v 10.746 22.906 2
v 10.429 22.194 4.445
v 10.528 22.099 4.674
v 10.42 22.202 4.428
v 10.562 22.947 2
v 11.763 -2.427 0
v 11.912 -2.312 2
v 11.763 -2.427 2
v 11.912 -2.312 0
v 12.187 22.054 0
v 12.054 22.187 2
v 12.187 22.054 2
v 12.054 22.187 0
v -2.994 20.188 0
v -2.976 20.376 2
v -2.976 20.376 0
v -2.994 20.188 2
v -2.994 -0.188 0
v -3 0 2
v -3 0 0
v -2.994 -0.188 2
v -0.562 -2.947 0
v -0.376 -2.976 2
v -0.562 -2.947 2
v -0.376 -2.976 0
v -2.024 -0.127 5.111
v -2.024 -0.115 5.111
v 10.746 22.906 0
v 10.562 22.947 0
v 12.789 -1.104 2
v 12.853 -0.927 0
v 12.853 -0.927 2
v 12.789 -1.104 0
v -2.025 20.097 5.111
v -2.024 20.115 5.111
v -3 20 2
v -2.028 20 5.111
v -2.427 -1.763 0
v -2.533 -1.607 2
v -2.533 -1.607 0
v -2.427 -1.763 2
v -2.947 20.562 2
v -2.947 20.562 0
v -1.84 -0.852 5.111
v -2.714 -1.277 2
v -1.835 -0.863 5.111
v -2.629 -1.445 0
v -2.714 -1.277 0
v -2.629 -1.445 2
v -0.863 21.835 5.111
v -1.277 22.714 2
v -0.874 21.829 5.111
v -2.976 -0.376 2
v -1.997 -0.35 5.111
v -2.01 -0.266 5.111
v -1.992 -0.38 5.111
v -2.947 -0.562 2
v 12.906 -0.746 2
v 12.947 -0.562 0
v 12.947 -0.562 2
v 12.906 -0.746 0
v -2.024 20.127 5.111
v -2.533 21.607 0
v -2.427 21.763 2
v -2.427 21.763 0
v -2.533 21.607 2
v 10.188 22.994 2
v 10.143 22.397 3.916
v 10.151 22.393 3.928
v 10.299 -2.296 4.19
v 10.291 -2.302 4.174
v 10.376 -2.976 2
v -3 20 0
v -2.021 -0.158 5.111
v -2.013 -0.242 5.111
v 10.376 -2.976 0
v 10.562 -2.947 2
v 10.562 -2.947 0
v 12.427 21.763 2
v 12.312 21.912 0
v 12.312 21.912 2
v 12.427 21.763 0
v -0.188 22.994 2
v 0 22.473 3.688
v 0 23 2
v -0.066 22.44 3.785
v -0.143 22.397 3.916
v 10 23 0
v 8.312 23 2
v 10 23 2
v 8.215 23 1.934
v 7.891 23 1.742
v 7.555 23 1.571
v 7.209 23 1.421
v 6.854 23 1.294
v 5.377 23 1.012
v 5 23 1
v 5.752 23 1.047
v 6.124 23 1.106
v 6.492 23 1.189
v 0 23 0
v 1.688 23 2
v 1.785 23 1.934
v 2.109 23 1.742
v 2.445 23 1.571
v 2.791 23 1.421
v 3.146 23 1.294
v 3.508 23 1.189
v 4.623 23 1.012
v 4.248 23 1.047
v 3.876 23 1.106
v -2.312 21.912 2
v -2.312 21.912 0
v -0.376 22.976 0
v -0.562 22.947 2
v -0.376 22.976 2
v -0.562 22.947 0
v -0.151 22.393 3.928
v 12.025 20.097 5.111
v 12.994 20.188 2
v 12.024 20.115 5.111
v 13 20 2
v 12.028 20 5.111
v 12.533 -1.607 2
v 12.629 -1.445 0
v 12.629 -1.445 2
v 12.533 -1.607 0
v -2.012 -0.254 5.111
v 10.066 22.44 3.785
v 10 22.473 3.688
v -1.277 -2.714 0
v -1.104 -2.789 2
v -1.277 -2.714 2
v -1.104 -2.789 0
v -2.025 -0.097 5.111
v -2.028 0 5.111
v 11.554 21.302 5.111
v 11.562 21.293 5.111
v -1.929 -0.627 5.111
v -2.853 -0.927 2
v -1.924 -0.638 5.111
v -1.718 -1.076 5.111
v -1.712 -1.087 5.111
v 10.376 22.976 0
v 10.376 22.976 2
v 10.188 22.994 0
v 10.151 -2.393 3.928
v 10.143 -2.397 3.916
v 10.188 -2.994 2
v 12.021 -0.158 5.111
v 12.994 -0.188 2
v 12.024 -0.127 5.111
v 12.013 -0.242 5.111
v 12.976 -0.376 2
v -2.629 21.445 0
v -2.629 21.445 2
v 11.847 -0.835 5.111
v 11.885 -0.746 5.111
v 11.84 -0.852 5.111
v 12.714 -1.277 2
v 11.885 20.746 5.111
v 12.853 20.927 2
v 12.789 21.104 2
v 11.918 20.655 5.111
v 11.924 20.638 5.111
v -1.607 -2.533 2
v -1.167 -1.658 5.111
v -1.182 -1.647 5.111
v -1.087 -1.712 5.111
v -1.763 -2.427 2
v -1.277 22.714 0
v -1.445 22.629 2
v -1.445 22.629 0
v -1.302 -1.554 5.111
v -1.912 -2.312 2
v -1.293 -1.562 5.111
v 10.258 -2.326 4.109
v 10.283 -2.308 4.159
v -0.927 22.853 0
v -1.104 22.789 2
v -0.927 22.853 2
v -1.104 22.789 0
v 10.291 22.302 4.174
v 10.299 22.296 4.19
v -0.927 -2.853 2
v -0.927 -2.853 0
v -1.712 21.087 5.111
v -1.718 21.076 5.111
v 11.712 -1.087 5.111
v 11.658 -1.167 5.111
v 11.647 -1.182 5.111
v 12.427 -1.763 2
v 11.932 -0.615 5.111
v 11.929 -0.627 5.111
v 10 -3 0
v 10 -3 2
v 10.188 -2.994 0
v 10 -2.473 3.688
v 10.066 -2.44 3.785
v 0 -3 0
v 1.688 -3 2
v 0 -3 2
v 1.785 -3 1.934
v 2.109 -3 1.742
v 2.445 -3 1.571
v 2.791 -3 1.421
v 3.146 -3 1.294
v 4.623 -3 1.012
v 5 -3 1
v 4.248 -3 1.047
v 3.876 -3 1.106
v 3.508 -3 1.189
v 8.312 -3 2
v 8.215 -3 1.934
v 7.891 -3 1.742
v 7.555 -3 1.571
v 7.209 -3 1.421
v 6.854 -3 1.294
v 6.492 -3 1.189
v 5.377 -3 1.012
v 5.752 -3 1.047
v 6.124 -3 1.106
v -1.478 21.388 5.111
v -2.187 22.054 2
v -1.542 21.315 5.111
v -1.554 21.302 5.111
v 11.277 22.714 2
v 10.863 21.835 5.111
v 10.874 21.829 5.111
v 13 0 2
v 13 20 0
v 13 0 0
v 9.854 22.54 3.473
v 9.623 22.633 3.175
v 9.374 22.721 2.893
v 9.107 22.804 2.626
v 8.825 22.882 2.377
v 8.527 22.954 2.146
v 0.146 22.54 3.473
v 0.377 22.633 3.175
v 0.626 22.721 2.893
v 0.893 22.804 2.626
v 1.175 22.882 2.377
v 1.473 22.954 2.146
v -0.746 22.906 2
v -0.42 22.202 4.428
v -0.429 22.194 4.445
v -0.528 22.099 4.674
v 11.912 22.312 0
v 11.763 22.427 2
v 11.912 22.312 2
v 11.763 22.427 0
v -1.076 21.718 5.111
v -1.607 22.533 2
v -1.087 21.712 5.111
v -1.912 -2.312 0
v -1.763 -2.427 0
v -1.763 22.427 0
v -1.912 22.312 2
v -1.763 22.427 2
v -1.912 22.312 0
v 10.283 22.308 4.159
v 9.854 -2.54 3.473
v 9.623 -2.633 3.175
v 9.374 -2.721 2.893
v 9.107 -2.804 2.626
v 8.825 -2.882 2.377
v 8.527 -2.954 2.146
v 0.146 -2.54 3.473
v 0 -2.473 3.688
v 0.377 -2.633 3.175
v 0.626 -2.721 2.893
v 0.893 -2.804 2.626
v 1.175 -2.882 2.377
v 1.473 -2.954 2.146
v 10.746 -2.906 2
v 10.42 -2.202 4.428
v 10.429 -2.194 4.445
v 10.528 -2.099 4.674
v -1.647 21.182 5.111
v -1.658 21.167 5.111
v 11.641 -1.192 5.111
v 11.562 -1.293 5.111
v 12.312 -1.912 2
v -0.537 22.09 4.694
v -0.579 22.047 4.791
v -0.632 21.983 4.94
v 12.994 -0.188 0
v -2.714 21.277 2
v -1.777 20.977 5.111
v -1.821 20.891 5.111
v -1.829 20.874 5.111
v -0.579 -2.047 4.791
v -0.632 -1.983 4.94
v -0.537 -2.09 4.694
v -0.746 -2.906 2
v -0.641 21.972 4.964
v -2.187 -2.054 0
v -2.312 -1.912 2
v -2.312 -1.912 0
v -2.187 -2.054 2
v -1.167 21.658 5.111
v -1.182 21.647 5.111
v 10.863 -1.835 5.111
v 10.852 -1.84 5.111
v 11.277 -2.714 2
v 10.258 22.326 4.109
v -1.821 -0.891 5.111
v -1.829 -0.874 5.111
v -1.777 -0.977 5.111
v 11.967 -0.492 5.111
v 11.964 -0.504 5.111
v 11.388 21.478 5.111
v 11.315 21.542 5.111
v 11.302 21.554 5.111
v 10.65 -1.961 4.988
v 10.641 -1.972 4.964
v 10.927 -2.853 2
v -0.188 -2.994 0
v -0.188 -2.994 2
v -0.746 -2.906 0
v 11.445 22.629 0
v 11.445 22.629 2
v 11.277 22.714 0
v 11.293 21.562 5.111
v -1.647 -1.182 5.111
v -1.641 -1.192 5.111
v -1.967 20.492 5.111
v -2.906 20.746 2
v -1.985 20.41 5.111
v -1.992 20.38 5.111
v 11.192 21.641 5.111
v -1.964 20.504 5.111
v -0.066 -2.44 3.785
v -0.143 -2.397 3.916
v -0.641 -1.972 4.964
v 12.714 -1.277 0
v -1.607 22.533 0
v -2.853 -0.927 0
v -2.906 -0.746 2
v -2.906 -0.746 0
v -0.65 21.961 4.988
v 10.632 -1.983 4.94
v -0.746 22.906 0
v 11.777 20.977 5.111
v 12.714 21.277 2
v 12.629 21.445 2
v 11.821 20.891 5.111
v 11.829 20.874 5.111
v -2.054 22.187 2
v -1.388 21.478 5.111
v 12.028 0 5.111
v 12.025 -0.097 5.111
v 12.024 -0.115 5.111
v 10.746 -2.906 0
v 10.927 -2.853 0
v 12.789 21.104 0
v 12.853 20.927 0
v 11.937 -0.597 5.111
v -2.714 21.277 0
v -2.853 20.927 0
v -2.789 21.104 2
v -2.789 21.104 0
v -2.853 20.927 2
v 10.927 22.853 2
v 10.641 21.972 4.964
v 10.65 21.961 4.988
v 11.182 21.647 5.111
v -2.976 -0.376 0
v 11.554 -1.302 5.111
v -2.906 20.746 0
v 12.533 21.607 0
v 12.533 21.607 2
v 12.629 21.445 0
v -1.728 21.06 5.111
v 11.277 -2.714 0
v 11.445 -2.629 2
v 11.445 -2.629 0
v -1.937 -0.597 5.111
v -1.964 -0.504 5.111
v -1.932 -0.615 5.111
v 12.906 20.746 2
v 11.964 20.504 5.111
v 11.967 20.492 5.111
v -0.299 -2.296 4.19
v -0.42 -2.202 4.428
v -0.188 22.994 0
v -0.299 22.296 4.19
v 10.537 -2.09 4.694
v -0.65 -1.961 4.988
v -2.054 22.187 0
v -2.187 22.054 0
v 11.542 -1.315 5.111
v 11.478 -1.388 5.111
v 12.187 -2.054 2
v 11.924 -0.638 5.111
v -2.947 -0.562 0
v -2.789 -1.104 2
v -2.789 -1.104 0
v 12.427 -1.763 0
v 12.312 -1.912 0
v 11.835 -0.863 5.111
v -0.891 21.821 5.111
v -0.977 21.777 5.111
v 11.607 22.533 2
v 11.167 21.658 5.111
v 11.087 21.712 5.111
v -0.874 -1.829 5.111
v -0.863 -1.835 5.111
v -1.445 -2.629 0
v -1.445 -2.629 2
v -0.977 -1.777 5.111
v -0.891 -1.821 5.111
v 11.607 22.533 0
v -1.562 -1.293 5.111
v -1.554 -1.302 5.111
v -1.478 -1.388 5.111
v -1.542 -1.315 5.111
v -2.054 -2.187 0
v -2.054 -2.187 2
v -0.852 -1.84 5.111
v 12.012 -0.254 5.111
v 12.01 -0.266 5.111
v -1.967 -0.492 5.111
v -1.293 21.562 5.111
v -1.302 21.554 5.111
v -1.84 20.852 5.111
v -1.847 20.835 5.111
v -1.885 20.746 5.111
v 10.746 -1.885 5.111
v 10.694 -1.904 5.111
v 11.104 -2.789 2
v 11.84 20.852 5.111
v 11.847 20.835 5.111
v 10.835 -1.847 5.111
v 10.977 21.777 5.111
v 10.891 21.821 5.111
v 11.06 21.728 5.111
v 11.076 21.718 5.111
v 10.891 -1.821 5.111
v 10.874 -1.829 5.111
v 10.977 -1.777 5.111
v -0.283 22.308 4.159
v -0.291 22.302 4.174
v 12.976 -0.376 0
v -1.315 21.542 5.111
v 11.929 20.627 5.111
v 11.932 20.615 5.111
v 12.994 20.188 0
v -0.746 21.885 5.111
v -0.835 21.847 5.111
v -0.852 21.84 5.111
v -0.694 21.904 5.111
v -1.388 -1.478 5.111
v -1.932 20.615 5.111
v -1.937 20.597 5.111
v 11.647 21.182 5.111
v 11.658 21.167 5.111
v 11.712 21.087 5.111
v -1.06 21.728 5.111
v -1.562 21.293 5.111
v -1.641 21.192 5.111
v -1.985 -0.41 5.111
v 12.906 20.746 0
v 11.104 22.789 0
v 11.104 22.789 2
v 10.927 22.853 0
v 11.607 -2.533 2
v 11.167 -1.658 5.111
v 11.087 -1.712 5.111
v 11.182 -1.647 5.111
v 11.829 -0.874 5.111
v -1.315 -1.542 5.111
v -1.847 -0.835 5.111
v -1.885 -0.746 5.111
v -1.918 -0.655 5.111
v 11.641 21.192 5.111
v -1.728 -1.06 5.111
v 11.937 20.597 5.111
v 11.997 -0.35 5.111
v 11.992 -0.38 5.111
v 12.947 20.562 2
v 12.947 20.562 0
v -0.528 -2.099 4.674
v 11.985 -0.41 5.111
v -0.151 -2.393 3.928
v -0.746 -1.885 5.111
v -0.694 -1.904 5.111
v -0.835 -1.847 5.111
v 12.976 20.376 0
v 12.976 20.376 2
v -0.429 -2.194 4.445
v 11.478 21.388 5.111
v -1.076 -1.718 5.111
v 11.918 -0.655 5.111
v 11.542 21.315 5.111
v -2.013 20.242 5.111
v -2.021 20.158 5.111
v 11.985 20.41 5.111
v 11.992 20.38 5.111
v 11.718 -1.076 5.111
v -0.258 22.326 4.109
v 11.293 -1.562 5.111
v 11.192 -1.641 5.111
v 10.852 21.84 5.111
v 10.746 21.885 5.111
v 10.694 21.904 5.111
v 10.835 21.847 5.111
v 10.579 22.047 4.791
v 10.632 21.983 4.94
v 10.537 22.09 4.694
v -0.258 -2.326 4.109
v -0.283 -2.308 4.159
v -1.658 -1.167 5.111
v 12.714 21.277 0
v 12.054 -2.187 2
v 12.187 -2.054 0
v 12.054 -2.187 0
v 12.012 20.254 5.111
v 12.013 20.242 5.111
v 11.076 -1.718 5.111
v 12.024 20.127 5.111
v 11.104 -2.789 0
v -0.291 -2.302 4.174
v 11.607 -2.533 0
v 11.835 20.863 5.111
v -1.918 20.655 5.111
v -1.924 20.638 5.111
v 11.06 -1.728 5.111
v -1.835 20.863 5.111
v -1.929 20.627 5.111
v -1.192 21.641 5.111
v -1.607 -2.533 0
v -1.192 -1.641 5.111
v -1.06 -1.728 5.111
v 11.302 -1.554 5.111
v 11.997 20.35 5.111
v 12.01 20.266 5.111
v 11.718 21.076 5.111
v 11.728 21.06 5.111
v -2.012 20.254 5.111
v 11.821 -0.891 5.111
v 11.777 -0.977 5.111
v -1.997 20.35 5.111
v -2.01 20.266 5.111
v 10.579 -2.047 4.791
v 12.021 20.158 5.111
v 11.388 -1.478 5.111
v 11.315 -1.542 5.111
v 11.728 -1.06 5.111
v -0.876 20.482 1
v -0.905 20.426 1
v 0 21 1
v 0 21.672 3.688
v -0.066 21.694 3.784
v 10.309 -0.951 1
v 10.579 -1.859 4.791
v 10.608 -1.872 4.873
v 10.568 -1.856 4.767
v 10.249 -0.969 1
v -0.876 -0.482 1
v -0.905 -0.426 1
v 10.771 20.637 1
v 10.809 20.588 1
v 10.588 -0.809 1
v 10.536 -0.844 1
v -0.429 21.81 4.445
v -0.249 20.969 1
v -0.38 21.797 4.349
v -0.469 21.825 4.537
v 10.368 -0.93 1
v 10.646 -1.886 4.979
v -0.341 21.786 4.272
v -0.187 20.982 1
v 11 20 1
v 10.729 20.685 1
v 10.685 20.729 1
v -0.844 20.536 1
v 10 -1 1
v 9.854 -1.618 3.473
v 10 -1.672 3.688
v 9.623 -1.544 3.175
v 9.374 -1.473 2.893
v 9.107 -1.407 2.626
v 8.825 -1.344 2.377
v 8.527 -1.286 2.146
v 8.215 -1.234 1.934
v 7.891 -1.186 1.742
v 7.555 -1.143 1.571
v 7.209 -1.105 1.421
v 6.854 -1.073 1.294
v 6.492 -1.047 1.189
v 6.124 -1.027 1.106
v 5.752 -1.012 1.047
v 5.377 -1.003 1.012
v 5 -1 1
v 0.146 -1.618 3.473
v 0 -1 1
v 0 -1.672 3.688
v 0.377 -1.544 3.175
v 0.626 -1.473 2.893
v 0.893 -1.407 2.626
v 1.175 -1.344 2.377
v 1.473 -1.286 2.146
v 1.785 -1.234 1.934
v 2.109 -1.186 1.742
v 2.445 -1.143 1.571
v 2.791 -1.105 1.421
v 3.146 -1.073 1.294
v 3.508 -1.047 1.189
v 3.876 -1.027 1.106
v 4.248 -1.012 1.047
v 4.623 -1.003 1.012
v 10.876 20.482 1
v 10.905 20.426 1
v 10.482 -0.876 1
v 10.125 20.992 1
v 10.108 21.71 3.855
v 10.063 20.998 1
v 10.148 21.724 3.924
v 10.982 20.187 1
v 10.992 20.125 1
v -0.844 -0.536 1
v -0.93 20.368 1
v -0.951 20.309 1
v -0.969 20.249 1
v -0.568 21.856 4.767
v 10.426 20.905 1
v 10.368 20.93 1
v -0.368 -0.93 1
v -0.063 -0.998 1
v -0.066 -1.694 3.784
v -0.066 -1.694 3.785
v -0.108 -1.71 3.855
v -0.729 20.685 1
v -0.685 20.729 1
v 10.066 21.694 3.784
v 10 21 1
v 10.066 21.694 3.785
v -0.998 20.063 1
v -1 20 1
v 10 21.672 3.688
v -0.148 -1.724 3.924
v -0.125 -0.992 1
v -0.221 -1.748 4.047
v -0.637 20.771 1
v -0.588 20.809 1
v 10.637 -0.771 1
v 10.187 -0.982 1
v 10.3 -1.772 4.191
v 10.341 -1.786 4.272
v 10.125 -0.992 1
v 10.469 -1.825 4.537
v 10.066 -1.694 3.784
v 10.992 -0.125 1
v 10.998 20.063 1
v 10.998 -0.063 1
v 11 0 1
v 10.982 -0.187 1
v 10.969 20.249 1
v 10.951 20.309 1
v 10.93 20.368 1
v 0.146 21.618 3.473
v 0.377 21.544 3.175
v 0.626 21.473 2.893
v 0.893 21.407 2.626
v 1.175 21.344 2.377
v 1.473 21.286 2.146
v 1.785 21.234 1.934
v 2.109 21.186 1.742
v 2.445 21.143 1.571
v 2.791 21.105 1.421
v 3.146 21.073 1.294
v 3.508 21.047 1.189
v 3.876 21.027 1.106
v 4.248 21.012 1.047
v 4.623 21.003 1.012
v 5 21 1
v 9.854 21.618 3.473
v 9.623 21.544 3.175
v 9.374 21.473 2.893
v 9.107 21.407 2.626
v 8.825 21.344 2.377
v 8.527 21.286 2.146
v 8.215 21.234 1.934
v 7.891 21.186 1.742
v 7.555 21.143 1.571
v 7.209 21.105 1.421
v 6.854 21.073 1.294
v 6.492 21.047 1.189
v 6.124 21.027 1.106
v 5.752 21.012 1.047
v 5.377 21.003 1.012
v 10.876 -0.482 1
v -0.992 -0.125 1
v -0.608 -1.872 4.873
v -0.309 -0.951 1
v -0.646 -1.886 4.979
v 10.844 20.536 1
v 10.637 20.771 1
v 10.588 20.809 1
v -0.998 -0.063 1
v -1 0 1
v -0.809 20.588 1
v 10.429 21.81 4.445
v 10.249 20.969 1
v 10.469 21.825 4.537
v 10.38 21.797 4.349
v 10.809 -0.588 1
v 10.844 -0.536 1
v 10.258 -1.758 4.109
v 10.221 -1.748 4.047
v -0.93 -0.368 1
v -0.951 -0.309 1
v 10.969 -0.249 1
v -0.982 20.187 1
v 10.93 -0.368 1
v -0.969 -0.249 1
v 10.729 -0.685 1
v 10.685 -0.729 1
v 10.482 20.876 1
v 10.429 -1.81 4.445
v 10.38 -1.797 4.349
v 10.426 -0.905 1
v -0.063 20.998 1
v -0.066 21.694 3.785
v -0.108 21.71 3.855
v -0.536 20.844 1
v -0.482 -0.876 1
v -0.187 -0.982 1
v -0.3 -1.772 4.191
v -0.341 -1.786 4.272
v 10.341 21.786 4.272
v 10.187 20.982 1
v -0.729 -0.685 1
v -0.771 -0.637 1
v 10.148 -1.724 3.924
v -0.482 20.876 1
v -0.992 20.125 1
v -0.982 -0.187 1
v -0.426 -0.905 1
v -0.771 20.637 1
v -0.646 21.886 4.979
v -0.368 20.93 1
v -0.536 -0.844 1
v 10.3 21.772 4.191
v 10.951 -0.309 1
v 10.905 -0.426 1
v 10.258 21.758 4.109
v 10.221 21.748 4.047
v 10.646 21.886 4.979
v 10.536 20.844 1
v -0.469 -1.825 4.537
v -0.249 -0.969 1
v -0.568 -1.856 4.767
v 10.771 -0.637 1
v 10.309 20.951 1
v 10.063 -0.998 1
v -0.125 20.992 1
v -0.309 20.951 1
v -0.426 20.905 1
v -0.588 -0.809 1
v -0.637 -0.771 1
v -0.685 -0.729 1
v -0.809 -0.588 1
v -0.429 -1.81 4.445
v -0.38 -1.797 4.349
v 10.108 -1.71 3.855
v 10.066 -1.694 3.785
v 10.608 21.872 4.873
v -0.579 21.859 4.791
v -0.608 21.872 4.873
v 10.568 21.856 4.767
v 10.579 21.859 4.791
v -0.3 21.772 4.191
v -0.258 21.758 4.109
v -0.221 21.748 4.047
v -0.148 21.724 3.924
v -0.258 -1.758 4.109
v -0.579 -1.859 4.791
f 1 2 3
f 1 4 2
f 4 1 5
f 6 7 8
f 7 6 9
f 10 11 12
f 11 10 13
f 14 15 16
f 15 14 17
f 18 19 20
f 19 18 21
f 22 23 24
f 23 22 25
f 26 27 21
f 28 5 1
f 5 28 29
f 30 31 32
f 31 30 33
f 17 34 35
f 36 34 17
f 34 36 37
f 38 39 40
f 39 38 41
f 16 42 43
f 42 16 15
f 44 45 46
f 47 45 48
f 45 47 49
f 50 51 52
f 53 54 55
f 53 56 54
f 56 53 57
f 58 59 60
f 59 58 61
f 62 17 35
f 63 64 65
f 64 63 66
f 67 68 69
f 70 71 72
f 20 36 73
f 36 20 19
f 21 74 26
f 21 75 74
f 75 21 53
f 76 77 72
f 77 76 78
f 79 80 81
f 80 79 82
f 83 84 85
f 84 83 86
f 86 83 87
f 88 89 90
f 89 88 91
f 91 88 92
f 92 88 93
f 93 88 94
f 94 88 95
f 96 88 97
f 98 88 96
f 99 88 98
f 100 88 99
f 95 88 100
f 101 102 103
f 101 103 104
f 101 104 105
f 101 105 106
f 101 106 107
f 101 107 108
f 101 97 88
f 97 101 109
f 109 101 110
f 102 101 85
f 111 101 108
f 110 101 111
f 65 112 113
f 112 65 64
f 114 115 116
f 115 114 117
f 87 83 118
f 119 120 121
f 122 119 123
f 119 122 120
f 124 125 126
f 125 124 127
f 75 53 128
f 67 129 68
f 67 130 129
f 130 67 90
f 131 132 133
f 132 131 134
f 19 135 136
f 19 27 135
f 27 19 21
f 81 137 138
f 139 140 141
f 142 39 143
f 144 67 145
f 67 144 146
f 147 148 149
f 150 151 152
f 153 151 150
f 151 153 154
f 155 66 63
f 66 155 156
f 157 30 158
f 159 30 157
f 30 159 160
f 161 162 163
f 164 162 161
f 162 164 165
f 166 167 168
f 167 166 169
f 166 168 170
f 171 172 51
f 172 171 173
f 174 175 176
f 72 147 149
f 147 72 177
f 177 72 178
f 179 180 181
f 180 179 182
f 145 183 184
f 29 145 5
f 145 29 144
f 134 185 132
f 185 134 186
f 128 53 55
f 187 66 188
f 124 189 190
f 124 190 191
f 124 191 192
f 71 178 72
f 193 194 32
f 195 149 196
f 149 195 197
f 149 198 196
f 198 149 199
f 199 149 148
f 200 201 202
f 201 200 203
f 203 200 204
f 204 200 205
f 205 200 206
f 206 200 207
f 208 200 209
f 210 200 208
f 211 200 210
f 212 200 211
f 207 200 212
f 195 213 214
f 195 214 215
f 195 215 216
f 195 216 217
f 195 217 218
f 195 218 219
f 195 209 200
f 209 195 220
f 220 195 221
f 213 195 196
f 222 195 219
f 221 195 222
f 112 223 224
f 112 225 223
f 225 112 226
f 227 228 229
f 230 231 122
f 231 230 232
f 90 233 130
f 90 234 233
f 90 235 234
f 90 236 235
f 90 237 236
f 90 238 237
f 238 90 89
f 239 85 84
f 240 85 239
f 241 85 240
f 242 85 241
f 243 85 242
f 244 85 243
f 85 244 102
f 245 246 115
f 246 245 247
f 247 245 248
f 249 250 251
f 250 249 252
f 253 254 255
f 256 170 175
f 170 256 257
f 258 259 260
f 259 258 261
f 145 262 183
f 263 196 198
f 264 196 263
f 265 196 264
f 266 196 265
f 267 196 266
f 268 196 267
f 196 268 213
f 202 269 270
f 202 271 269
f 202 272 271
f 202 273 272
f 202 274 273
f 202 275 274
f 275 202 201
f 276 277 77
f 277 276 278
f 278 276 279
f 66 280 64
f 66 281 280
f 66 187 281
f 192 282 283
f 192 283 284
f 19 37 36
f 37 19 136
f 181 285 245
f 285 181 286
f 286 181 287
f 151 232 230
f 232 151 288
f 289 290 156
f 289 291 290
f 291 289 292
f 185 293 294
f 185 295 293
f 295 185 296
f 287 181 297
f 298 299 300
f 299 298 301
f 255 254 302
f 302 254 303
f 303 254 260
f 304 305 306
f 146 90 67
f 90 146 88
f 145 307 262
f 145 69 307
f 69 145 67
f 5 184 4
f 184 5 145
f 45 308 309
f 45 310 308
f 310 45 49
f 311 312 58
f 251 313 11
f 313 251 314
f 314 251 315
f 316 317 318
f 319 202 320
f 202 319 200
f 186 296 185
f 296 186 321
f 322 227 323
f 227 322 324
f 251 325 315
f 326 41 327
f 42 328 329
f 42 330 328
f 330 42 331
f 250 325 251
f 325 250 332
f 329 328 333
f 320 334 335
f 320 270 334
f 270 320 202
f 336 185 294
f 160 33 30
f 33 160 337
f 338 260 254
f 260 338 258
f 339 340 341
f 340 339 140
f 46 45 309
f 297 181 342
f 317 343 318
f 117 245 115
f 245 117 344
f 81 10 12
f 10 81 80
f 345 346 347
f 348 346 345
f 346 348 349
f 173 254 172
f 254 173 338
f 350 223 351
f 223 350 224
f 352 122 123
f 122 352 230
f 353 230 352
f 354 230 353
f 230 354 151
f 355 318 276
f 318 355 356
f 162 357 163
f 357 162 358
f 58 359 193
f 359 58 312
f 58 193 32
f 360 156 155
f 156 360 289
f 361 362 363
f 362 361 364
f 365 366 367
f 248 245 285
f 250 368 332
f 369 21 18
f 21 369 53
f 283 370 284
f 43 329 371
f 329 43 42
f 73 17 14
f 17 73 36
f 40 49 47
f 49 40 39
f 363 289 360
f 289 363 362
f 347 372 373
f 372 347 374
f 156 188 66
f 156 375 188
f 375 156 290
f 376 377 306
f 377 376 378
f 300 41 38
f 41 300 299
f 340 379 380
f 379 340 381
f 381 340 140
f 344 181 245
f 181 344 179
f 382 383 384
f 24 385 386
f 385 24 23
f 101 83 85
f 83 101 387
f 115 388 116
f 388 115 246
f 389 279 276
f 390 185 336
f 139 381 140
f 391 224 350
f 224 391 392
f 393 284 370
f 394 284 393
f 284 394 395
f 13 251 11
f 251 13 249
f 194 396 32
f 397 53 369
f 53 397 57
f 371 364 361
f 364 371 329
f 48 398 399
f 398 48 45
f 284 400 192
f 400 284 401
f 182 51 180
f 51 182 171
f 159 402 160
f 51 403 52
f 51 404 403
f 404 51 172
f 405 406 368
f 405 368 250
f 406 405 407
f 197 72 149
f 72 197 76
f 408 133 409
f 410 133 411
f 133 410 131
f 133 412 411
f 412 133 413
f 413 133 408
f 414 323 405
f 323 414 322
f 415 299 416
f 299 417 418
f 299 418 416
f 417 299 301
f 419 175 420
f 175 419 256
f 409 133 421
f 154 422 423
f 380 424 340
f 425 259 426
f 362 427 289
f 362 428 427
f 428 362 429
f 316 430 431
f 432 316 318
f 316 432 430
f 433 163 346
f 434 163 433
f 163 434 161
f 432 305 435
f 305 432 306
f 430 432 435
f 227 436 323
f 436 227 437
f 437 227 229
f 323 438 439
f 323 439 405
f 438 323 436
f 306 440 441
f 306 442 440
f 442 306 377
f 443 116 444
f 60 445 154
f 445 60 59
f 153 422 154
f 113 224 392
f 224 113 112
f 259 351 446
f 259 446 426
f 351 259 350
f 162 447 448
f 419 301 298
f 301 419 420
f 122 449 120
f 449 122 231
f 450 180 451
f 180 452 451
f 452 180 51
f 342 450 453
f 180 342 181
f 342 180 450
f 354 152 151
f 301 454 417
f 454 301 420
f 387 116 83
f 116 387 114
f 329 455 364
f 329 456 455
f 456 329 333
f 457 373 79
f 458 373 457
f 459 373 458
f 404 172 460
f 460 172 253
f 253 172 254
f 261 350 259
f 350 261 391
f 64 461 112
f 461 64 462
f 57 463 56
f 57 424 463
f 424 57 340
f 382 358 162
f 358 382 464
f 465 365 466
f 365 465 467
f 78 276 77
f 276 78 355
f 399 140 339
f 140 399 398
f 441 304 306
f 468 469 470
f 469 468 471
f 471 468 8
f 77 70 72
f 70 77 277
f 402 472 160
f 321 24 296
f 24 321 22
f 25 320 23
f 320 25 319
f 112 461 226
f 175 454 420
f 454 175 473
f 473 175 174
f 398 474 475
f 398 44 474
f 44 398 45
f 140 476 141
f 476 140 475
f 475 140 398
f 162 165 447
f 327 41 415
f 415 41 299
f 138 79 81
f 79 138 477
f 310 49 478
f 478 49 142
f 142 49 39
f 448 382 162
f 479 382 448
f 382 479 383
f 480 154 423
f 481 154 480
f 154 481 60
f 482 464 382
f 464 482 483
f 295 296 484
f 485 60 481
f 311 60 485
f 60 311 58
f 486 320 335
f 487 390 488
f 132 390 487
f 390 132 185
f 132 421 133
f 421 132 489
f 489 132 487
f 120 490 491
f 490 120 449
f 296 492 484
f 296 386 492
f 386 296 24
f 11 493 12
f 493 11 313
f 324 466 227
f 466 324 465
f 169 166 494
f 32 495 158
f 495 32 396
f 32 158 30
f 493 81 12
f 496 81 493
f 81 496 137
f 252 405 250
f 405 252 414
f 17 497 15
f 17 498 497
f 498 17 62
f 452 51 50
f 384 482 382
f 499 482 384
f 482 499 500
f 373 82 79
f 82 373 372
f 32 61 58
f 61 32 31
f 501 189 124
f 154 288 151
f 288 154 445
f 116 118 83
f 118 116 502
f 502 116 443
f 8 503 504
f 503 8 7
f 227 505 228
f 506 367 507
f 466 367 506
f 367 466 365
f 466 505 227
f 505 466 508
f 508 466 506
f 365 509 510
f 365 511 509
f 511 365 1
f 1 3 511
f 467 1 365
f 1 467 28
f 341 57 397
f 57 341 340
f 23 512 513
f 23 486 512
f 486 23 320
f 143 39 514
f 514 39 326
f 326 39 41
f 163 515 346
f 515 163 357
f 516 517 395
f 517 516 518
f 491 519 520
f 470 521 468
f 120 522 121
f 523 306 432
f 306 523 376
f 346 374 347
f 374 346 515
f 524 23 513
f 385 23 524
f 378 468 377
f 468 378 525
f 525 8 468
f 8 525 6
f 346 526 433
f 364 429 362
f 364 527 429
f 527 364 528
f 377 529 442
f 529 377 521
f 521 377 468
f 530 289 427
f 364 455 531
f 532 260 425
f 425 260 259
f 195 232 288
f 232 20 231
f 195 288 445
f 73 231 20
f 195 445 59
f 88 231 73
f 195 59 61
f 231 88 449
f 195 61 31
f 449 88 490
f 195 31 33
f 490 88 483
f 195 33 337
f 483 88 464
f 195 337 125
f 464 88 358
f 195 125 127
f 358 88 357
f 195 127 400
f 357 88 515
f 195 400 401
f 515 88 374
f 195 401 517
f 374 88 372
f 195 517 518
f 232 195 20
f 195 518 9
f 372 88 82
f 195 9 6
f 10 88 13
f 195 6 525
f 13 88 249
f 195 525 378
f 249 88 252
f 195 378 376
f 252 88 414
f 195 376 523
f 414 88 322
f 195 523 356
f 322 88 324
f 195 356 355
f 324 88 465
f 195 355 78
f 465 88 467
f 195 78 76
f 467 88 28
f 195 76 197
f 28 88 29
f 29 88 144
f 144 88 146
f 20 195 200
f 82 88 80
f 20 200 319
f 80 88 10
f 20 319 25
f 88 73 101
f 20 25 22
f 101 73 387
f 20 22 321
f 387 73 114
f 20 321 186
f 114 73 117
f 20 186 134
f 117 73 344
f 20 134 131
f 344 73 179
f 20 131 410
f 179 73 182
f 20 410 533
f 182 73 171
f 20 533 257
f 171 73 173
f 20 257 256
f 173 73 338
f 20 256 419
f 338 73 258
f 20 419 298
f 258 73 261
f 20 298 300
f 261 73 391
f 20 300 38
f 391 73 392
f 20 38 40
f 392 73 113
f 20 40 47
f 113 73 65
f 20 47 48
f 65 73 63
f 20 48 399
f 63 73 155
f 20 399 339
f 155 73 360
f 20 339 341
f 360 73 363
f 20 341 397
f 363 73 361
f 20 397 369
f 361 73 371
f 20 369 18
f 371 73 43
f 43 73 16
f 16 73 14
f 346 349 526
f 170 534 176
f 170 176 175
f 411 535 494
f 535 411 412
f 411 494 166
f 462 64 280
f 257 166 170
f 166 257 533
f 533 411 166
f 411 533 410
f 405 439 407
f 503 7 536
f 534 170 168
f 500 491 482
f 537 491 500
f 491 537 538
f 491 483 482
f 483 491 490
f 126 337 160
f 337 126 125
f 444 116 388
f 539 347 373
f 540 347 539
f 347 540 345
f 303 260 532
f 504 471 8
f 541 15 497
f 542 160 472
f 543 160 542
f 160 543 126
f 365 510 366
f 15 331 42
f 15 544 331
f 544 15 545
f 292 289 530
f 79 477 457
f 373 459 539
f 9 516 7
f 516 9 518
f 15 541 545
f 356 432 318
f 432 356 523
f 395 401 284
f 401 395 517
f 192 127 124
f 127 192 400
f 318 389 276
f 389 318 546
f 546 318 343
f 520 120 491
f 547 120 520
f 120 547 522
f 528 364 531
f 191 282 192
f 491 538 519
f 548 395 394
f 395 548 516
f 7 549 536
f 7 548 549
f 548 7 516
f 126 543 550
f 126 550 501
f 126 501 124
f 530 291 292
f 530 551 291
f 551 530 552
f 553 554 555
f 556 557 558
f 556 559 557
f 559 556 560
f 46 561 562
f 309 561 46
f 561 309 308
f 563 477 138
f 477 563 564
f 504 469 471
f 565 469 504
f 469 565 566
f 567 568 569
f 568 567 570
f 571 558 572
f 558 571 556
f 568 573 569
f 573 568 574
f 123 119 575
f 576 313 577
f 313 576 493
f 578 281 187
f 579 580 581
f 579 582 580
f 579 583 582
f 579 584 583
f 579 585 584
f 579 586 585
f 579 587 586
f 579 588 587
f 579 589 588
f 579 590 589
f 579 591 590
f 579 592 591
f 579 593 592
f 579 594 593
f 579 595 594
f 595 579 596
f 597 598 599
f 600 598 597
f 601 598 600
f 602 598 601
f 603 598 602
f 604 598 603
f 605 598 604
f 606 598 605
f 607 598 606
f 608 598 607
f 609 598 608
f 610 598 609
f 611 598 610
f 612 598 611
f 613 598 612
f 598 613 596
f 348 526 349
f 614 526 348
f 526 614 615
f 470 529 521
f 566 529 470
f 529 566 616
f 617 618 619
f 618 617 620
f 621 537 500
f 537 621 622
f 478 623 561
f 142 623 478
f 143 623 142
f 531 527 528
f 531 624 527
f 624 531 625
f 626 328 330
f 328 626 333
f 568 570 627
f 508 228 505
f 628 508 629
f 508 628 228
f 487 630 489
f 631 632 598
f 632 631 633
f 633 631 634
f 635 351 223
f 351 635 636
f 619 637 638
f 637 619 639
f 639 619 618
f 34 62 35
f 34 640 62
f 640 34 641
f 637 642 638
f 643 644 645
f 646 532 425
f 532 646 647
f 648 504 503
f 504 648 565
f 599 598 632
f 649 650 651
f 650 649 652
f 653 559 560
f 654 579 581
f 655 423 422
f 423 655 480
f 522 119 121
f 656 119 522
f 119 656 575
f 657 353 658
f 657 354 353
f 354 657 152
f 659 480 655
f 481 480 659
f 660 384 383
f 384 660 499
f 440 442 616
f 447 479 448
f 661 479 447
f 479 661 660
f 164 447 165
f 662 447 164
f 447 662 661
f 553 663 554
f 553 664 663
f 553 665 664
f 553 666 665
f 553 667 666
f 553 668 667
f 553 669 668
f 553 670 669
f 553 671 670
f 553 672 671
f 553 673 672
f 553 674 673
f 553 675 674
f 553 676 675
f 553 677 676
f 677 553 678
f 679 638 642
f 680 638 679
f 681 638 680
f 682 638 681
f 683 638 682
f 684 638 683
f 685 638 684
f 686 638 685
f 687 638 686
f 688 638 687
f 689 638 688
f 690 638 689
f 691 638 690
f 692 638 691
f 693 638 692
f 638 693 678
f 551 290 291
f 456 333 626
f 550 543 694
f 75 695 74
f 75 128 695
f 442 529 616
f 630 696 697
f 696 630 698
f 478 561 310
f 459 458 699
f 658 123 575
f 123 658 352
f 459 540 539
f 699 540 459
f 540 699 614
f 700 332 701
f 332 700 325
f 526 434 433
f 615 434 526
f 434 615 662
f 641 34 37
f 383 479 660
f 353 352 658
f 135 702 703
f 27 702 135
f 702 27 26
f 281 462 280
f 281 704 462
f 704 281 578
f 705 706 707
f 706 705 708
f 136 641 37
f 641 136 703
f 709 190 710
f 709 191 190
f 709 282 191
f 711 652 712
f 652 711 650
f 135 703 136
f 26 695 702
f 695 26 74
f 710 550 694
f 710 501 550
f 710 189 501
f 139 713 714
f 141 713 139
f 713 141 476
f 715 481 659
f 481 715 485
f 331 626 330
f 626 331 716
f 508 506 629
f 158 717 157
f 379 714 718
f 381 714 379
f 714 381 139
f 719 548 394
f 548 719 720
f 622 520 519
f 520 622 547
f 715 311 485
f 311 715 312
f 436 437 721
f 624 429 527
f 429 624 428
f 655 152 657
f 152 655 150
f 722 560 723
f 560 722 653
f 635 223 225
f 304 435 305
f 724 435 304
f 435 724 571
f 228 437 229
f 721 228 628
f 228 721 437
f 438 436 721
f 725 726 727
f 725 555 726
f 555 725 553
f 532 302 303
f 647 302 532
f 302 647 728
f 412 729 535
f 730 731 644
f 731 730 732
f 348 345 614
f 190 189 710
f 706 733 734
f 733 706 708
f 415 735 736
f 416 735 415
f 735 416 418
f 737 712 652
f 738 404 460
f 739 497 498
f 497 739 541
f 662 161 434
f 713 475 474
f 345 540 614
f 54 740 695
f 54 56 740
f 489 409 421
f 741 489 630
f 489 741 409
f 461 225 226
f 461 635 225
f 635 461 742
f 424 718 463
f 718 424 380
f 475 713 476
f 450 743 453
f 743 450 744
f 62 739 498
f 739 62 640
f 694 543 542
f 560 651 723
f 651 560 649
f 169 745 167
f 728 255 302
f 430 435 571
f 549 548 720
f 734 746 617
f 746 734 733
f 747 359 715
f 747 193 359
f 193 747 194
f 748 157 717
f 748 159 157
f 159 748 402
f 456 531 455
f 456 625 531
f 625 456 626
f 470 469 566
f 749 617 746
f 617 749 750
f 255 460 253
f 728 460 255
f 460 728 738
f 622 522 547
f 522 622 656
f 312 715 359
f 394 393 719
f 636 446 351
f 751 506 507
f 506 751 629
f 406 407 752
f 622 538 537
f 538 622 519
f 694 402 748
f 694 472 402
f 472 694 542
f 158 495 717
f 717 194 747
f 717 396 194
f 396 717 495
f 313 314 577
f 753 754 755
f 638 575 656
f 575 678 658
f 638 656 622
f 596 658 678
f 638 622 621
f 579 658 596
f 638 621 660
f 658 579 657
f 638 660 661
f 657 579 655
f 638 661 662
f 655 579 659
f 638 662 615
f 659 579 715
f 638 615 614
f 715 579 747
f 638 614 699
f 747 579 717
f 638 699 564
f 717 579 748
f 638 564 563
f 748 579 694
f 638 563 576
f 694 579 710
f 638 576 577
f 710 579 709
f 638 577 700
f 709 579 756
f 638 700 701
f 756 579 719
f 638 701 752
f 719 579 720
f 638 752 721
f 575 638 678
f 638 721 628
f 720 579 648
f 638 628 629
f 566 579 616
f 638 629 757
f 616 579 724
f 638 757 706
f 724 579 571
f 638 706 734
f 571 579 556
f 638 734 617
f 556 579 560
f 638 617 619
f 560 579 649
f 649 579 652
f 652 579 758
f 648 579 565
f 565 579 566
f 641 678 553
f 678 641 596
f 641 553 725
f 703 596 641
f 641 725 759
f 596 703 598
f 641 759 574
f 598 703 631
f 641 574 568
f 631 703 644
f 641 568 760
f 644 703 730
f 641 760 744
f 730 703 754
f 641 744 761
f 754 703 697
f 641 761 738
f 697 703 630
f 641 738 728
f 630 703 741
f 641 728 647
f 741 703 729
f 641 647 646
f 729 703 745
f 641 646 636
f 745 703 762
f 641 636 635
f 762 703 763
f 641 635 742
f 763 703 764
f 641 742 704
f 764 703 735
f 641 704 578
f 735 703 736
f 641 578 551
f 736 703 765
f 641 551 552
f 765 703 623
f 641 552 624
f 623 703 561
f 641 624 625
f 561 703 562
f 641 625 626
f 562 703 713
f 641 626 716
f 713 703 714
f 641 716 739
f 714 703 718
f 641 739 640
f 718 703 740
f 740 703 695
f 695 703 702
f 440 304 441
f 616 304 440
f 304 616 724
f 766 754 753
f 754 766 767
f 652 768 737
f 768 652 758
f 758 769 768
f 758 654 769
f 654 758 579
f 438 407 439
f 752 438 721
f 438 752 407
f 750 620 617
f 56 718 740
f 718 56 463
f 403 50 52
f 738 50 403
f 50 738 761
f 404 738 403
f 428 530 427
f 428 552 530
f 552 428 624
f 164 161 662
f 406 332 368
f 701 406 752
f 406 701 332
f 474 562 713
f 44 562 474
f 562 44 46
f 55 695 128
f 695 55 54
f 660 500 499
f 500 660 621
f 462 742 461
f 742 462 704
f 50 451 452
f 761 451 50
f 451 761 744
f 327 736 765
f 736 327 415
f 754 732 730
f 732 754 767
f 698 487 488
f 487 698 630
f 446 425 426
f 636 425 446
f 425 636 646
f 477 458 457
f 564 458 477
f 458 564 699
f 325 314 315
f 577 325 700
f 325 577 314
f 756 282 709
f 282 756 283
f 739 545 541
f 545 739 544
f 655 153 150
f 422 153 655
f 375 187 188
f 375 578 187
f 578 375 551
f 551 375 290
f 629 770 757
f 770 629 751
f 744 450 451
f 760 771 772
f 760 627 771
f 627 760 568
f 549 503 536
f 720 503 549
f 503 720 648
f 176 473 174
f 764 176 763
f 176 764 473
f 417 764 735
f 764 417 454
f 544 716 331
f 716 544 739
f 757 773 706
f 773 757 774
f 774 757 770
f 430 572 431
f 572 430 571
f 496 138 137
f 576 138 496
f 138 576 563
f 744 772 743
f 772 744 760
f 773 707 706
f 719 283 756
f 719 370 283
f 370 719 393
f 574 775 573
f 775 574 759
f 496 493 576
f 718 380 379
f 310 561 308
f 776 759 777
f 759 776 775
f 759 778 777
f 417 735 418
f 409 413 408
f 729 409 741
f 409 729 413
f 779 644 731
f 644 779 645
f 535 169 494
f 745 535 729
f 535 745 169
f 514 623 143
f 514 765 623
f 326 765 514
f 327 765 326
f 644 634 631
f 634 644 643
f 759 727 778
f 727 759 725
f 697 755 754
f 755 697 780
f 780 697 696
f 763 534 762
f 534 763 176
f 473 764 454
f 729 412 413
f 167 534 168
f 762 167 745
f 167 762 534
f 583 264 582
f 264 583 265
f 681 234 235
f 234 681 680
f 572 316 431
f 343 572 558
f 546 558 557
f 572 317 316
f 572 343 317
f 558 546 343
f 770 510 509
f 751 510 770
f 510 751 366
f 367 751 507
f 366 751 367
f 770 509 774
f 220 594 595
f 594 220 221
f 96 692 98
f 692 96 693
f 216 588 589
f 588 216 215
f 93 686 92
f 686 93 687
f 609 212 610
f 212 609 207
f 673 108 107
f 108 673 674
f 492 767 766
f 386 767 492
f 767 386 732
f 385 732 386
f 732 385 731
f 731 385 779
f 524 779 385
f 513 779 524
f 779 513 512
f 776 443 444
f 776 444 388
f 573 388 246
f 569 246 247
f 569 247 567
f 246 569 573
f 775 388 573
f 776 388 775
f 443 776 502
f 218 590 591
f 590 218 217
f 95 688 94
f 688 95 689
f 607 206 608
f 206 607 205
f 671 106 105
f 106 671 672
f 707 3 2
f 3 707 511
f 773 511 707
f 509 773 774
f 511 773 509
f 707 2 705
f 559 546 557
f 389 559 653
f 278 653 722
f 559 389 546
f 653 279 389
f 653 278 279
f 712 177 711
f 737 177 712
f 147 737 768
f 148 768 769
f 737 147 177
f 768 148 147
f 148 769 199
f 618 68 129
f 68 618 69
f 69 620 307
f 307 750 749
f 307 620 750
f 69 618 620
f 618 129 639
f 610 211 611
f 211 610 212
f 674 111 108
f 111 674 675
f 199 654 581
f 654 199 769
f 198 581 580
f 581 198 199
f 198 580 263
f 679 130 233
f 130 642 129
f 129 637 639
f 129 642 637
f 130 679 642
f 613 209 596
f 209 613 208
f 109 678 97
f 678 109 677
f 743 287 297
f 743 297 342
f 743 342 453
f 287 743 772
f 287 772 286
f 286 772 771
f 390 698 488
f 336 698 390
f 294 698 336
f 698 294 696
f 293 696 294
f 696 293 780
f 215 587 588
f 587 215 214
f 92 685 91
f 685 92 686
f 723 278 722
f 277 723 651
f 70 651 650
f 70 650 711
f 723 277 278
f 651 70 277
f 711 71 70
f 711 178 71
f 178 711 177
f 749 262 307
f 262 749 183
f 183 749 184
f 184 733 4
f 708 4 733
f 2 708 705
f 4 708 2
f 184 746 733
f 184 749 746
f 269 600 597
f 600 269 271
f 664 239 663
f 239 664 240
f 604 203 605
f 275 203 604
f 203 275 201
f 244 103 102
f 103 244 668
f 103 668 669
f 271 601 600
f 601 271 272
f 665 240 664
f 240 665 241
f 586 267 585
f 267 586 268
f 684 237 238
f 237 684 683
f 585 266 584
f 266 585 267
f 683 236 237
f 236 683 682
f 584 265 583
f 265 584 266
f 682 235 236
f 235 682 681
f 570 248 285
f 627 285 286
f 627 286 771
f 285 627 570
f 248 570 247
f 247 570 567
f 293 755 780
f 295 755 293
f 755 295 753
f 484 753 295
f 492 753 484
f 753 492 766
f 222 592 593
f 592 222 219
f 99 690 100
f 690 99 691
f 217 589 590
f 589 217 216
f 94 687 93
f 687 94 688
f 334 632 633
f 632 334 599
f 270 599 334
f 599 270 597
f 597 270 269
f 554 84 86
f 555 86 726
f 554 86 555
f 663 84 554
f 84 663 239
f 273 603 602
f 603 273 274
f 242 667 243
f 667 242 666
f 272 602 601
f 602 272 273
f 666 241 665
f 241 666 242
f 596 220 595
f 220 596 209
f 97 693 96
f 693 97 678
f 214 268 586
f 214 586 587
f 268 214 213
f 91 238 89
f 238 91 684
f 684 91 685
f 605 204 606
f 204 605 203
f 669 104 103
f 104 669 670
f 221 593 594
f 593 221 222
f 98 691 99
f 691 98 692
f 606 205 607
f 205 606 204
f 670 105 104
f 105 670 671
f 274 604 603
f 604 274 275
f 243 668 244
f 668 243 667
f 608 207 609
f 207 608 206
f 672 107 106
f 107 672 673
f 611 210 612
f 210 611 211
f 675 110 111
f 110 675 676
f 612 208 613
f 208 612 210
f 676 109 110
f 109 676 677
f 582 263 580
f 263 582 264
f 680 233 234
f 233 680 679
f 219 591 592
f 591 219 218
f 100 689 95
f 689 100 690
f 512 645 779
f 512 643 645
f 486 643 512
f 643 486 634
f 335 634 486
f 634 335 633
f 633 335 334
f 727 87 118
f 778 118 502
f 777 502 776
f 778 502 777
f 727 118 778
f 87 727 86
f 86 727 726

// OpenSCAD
$fn=100;
difference(){
difference(){
minkowski(){
cube([10,20,2]);
cylinder(8,d1=6,d2=1);
}
translate([0,0,1]){

minkowski(){
cube([10,20,2]);
cylinder(8,d1=2,d2=6);
}
}
}

translate([5,-3,7]){
rotate([270,0,0]){
cylinder(32,d=12);
}}

}
